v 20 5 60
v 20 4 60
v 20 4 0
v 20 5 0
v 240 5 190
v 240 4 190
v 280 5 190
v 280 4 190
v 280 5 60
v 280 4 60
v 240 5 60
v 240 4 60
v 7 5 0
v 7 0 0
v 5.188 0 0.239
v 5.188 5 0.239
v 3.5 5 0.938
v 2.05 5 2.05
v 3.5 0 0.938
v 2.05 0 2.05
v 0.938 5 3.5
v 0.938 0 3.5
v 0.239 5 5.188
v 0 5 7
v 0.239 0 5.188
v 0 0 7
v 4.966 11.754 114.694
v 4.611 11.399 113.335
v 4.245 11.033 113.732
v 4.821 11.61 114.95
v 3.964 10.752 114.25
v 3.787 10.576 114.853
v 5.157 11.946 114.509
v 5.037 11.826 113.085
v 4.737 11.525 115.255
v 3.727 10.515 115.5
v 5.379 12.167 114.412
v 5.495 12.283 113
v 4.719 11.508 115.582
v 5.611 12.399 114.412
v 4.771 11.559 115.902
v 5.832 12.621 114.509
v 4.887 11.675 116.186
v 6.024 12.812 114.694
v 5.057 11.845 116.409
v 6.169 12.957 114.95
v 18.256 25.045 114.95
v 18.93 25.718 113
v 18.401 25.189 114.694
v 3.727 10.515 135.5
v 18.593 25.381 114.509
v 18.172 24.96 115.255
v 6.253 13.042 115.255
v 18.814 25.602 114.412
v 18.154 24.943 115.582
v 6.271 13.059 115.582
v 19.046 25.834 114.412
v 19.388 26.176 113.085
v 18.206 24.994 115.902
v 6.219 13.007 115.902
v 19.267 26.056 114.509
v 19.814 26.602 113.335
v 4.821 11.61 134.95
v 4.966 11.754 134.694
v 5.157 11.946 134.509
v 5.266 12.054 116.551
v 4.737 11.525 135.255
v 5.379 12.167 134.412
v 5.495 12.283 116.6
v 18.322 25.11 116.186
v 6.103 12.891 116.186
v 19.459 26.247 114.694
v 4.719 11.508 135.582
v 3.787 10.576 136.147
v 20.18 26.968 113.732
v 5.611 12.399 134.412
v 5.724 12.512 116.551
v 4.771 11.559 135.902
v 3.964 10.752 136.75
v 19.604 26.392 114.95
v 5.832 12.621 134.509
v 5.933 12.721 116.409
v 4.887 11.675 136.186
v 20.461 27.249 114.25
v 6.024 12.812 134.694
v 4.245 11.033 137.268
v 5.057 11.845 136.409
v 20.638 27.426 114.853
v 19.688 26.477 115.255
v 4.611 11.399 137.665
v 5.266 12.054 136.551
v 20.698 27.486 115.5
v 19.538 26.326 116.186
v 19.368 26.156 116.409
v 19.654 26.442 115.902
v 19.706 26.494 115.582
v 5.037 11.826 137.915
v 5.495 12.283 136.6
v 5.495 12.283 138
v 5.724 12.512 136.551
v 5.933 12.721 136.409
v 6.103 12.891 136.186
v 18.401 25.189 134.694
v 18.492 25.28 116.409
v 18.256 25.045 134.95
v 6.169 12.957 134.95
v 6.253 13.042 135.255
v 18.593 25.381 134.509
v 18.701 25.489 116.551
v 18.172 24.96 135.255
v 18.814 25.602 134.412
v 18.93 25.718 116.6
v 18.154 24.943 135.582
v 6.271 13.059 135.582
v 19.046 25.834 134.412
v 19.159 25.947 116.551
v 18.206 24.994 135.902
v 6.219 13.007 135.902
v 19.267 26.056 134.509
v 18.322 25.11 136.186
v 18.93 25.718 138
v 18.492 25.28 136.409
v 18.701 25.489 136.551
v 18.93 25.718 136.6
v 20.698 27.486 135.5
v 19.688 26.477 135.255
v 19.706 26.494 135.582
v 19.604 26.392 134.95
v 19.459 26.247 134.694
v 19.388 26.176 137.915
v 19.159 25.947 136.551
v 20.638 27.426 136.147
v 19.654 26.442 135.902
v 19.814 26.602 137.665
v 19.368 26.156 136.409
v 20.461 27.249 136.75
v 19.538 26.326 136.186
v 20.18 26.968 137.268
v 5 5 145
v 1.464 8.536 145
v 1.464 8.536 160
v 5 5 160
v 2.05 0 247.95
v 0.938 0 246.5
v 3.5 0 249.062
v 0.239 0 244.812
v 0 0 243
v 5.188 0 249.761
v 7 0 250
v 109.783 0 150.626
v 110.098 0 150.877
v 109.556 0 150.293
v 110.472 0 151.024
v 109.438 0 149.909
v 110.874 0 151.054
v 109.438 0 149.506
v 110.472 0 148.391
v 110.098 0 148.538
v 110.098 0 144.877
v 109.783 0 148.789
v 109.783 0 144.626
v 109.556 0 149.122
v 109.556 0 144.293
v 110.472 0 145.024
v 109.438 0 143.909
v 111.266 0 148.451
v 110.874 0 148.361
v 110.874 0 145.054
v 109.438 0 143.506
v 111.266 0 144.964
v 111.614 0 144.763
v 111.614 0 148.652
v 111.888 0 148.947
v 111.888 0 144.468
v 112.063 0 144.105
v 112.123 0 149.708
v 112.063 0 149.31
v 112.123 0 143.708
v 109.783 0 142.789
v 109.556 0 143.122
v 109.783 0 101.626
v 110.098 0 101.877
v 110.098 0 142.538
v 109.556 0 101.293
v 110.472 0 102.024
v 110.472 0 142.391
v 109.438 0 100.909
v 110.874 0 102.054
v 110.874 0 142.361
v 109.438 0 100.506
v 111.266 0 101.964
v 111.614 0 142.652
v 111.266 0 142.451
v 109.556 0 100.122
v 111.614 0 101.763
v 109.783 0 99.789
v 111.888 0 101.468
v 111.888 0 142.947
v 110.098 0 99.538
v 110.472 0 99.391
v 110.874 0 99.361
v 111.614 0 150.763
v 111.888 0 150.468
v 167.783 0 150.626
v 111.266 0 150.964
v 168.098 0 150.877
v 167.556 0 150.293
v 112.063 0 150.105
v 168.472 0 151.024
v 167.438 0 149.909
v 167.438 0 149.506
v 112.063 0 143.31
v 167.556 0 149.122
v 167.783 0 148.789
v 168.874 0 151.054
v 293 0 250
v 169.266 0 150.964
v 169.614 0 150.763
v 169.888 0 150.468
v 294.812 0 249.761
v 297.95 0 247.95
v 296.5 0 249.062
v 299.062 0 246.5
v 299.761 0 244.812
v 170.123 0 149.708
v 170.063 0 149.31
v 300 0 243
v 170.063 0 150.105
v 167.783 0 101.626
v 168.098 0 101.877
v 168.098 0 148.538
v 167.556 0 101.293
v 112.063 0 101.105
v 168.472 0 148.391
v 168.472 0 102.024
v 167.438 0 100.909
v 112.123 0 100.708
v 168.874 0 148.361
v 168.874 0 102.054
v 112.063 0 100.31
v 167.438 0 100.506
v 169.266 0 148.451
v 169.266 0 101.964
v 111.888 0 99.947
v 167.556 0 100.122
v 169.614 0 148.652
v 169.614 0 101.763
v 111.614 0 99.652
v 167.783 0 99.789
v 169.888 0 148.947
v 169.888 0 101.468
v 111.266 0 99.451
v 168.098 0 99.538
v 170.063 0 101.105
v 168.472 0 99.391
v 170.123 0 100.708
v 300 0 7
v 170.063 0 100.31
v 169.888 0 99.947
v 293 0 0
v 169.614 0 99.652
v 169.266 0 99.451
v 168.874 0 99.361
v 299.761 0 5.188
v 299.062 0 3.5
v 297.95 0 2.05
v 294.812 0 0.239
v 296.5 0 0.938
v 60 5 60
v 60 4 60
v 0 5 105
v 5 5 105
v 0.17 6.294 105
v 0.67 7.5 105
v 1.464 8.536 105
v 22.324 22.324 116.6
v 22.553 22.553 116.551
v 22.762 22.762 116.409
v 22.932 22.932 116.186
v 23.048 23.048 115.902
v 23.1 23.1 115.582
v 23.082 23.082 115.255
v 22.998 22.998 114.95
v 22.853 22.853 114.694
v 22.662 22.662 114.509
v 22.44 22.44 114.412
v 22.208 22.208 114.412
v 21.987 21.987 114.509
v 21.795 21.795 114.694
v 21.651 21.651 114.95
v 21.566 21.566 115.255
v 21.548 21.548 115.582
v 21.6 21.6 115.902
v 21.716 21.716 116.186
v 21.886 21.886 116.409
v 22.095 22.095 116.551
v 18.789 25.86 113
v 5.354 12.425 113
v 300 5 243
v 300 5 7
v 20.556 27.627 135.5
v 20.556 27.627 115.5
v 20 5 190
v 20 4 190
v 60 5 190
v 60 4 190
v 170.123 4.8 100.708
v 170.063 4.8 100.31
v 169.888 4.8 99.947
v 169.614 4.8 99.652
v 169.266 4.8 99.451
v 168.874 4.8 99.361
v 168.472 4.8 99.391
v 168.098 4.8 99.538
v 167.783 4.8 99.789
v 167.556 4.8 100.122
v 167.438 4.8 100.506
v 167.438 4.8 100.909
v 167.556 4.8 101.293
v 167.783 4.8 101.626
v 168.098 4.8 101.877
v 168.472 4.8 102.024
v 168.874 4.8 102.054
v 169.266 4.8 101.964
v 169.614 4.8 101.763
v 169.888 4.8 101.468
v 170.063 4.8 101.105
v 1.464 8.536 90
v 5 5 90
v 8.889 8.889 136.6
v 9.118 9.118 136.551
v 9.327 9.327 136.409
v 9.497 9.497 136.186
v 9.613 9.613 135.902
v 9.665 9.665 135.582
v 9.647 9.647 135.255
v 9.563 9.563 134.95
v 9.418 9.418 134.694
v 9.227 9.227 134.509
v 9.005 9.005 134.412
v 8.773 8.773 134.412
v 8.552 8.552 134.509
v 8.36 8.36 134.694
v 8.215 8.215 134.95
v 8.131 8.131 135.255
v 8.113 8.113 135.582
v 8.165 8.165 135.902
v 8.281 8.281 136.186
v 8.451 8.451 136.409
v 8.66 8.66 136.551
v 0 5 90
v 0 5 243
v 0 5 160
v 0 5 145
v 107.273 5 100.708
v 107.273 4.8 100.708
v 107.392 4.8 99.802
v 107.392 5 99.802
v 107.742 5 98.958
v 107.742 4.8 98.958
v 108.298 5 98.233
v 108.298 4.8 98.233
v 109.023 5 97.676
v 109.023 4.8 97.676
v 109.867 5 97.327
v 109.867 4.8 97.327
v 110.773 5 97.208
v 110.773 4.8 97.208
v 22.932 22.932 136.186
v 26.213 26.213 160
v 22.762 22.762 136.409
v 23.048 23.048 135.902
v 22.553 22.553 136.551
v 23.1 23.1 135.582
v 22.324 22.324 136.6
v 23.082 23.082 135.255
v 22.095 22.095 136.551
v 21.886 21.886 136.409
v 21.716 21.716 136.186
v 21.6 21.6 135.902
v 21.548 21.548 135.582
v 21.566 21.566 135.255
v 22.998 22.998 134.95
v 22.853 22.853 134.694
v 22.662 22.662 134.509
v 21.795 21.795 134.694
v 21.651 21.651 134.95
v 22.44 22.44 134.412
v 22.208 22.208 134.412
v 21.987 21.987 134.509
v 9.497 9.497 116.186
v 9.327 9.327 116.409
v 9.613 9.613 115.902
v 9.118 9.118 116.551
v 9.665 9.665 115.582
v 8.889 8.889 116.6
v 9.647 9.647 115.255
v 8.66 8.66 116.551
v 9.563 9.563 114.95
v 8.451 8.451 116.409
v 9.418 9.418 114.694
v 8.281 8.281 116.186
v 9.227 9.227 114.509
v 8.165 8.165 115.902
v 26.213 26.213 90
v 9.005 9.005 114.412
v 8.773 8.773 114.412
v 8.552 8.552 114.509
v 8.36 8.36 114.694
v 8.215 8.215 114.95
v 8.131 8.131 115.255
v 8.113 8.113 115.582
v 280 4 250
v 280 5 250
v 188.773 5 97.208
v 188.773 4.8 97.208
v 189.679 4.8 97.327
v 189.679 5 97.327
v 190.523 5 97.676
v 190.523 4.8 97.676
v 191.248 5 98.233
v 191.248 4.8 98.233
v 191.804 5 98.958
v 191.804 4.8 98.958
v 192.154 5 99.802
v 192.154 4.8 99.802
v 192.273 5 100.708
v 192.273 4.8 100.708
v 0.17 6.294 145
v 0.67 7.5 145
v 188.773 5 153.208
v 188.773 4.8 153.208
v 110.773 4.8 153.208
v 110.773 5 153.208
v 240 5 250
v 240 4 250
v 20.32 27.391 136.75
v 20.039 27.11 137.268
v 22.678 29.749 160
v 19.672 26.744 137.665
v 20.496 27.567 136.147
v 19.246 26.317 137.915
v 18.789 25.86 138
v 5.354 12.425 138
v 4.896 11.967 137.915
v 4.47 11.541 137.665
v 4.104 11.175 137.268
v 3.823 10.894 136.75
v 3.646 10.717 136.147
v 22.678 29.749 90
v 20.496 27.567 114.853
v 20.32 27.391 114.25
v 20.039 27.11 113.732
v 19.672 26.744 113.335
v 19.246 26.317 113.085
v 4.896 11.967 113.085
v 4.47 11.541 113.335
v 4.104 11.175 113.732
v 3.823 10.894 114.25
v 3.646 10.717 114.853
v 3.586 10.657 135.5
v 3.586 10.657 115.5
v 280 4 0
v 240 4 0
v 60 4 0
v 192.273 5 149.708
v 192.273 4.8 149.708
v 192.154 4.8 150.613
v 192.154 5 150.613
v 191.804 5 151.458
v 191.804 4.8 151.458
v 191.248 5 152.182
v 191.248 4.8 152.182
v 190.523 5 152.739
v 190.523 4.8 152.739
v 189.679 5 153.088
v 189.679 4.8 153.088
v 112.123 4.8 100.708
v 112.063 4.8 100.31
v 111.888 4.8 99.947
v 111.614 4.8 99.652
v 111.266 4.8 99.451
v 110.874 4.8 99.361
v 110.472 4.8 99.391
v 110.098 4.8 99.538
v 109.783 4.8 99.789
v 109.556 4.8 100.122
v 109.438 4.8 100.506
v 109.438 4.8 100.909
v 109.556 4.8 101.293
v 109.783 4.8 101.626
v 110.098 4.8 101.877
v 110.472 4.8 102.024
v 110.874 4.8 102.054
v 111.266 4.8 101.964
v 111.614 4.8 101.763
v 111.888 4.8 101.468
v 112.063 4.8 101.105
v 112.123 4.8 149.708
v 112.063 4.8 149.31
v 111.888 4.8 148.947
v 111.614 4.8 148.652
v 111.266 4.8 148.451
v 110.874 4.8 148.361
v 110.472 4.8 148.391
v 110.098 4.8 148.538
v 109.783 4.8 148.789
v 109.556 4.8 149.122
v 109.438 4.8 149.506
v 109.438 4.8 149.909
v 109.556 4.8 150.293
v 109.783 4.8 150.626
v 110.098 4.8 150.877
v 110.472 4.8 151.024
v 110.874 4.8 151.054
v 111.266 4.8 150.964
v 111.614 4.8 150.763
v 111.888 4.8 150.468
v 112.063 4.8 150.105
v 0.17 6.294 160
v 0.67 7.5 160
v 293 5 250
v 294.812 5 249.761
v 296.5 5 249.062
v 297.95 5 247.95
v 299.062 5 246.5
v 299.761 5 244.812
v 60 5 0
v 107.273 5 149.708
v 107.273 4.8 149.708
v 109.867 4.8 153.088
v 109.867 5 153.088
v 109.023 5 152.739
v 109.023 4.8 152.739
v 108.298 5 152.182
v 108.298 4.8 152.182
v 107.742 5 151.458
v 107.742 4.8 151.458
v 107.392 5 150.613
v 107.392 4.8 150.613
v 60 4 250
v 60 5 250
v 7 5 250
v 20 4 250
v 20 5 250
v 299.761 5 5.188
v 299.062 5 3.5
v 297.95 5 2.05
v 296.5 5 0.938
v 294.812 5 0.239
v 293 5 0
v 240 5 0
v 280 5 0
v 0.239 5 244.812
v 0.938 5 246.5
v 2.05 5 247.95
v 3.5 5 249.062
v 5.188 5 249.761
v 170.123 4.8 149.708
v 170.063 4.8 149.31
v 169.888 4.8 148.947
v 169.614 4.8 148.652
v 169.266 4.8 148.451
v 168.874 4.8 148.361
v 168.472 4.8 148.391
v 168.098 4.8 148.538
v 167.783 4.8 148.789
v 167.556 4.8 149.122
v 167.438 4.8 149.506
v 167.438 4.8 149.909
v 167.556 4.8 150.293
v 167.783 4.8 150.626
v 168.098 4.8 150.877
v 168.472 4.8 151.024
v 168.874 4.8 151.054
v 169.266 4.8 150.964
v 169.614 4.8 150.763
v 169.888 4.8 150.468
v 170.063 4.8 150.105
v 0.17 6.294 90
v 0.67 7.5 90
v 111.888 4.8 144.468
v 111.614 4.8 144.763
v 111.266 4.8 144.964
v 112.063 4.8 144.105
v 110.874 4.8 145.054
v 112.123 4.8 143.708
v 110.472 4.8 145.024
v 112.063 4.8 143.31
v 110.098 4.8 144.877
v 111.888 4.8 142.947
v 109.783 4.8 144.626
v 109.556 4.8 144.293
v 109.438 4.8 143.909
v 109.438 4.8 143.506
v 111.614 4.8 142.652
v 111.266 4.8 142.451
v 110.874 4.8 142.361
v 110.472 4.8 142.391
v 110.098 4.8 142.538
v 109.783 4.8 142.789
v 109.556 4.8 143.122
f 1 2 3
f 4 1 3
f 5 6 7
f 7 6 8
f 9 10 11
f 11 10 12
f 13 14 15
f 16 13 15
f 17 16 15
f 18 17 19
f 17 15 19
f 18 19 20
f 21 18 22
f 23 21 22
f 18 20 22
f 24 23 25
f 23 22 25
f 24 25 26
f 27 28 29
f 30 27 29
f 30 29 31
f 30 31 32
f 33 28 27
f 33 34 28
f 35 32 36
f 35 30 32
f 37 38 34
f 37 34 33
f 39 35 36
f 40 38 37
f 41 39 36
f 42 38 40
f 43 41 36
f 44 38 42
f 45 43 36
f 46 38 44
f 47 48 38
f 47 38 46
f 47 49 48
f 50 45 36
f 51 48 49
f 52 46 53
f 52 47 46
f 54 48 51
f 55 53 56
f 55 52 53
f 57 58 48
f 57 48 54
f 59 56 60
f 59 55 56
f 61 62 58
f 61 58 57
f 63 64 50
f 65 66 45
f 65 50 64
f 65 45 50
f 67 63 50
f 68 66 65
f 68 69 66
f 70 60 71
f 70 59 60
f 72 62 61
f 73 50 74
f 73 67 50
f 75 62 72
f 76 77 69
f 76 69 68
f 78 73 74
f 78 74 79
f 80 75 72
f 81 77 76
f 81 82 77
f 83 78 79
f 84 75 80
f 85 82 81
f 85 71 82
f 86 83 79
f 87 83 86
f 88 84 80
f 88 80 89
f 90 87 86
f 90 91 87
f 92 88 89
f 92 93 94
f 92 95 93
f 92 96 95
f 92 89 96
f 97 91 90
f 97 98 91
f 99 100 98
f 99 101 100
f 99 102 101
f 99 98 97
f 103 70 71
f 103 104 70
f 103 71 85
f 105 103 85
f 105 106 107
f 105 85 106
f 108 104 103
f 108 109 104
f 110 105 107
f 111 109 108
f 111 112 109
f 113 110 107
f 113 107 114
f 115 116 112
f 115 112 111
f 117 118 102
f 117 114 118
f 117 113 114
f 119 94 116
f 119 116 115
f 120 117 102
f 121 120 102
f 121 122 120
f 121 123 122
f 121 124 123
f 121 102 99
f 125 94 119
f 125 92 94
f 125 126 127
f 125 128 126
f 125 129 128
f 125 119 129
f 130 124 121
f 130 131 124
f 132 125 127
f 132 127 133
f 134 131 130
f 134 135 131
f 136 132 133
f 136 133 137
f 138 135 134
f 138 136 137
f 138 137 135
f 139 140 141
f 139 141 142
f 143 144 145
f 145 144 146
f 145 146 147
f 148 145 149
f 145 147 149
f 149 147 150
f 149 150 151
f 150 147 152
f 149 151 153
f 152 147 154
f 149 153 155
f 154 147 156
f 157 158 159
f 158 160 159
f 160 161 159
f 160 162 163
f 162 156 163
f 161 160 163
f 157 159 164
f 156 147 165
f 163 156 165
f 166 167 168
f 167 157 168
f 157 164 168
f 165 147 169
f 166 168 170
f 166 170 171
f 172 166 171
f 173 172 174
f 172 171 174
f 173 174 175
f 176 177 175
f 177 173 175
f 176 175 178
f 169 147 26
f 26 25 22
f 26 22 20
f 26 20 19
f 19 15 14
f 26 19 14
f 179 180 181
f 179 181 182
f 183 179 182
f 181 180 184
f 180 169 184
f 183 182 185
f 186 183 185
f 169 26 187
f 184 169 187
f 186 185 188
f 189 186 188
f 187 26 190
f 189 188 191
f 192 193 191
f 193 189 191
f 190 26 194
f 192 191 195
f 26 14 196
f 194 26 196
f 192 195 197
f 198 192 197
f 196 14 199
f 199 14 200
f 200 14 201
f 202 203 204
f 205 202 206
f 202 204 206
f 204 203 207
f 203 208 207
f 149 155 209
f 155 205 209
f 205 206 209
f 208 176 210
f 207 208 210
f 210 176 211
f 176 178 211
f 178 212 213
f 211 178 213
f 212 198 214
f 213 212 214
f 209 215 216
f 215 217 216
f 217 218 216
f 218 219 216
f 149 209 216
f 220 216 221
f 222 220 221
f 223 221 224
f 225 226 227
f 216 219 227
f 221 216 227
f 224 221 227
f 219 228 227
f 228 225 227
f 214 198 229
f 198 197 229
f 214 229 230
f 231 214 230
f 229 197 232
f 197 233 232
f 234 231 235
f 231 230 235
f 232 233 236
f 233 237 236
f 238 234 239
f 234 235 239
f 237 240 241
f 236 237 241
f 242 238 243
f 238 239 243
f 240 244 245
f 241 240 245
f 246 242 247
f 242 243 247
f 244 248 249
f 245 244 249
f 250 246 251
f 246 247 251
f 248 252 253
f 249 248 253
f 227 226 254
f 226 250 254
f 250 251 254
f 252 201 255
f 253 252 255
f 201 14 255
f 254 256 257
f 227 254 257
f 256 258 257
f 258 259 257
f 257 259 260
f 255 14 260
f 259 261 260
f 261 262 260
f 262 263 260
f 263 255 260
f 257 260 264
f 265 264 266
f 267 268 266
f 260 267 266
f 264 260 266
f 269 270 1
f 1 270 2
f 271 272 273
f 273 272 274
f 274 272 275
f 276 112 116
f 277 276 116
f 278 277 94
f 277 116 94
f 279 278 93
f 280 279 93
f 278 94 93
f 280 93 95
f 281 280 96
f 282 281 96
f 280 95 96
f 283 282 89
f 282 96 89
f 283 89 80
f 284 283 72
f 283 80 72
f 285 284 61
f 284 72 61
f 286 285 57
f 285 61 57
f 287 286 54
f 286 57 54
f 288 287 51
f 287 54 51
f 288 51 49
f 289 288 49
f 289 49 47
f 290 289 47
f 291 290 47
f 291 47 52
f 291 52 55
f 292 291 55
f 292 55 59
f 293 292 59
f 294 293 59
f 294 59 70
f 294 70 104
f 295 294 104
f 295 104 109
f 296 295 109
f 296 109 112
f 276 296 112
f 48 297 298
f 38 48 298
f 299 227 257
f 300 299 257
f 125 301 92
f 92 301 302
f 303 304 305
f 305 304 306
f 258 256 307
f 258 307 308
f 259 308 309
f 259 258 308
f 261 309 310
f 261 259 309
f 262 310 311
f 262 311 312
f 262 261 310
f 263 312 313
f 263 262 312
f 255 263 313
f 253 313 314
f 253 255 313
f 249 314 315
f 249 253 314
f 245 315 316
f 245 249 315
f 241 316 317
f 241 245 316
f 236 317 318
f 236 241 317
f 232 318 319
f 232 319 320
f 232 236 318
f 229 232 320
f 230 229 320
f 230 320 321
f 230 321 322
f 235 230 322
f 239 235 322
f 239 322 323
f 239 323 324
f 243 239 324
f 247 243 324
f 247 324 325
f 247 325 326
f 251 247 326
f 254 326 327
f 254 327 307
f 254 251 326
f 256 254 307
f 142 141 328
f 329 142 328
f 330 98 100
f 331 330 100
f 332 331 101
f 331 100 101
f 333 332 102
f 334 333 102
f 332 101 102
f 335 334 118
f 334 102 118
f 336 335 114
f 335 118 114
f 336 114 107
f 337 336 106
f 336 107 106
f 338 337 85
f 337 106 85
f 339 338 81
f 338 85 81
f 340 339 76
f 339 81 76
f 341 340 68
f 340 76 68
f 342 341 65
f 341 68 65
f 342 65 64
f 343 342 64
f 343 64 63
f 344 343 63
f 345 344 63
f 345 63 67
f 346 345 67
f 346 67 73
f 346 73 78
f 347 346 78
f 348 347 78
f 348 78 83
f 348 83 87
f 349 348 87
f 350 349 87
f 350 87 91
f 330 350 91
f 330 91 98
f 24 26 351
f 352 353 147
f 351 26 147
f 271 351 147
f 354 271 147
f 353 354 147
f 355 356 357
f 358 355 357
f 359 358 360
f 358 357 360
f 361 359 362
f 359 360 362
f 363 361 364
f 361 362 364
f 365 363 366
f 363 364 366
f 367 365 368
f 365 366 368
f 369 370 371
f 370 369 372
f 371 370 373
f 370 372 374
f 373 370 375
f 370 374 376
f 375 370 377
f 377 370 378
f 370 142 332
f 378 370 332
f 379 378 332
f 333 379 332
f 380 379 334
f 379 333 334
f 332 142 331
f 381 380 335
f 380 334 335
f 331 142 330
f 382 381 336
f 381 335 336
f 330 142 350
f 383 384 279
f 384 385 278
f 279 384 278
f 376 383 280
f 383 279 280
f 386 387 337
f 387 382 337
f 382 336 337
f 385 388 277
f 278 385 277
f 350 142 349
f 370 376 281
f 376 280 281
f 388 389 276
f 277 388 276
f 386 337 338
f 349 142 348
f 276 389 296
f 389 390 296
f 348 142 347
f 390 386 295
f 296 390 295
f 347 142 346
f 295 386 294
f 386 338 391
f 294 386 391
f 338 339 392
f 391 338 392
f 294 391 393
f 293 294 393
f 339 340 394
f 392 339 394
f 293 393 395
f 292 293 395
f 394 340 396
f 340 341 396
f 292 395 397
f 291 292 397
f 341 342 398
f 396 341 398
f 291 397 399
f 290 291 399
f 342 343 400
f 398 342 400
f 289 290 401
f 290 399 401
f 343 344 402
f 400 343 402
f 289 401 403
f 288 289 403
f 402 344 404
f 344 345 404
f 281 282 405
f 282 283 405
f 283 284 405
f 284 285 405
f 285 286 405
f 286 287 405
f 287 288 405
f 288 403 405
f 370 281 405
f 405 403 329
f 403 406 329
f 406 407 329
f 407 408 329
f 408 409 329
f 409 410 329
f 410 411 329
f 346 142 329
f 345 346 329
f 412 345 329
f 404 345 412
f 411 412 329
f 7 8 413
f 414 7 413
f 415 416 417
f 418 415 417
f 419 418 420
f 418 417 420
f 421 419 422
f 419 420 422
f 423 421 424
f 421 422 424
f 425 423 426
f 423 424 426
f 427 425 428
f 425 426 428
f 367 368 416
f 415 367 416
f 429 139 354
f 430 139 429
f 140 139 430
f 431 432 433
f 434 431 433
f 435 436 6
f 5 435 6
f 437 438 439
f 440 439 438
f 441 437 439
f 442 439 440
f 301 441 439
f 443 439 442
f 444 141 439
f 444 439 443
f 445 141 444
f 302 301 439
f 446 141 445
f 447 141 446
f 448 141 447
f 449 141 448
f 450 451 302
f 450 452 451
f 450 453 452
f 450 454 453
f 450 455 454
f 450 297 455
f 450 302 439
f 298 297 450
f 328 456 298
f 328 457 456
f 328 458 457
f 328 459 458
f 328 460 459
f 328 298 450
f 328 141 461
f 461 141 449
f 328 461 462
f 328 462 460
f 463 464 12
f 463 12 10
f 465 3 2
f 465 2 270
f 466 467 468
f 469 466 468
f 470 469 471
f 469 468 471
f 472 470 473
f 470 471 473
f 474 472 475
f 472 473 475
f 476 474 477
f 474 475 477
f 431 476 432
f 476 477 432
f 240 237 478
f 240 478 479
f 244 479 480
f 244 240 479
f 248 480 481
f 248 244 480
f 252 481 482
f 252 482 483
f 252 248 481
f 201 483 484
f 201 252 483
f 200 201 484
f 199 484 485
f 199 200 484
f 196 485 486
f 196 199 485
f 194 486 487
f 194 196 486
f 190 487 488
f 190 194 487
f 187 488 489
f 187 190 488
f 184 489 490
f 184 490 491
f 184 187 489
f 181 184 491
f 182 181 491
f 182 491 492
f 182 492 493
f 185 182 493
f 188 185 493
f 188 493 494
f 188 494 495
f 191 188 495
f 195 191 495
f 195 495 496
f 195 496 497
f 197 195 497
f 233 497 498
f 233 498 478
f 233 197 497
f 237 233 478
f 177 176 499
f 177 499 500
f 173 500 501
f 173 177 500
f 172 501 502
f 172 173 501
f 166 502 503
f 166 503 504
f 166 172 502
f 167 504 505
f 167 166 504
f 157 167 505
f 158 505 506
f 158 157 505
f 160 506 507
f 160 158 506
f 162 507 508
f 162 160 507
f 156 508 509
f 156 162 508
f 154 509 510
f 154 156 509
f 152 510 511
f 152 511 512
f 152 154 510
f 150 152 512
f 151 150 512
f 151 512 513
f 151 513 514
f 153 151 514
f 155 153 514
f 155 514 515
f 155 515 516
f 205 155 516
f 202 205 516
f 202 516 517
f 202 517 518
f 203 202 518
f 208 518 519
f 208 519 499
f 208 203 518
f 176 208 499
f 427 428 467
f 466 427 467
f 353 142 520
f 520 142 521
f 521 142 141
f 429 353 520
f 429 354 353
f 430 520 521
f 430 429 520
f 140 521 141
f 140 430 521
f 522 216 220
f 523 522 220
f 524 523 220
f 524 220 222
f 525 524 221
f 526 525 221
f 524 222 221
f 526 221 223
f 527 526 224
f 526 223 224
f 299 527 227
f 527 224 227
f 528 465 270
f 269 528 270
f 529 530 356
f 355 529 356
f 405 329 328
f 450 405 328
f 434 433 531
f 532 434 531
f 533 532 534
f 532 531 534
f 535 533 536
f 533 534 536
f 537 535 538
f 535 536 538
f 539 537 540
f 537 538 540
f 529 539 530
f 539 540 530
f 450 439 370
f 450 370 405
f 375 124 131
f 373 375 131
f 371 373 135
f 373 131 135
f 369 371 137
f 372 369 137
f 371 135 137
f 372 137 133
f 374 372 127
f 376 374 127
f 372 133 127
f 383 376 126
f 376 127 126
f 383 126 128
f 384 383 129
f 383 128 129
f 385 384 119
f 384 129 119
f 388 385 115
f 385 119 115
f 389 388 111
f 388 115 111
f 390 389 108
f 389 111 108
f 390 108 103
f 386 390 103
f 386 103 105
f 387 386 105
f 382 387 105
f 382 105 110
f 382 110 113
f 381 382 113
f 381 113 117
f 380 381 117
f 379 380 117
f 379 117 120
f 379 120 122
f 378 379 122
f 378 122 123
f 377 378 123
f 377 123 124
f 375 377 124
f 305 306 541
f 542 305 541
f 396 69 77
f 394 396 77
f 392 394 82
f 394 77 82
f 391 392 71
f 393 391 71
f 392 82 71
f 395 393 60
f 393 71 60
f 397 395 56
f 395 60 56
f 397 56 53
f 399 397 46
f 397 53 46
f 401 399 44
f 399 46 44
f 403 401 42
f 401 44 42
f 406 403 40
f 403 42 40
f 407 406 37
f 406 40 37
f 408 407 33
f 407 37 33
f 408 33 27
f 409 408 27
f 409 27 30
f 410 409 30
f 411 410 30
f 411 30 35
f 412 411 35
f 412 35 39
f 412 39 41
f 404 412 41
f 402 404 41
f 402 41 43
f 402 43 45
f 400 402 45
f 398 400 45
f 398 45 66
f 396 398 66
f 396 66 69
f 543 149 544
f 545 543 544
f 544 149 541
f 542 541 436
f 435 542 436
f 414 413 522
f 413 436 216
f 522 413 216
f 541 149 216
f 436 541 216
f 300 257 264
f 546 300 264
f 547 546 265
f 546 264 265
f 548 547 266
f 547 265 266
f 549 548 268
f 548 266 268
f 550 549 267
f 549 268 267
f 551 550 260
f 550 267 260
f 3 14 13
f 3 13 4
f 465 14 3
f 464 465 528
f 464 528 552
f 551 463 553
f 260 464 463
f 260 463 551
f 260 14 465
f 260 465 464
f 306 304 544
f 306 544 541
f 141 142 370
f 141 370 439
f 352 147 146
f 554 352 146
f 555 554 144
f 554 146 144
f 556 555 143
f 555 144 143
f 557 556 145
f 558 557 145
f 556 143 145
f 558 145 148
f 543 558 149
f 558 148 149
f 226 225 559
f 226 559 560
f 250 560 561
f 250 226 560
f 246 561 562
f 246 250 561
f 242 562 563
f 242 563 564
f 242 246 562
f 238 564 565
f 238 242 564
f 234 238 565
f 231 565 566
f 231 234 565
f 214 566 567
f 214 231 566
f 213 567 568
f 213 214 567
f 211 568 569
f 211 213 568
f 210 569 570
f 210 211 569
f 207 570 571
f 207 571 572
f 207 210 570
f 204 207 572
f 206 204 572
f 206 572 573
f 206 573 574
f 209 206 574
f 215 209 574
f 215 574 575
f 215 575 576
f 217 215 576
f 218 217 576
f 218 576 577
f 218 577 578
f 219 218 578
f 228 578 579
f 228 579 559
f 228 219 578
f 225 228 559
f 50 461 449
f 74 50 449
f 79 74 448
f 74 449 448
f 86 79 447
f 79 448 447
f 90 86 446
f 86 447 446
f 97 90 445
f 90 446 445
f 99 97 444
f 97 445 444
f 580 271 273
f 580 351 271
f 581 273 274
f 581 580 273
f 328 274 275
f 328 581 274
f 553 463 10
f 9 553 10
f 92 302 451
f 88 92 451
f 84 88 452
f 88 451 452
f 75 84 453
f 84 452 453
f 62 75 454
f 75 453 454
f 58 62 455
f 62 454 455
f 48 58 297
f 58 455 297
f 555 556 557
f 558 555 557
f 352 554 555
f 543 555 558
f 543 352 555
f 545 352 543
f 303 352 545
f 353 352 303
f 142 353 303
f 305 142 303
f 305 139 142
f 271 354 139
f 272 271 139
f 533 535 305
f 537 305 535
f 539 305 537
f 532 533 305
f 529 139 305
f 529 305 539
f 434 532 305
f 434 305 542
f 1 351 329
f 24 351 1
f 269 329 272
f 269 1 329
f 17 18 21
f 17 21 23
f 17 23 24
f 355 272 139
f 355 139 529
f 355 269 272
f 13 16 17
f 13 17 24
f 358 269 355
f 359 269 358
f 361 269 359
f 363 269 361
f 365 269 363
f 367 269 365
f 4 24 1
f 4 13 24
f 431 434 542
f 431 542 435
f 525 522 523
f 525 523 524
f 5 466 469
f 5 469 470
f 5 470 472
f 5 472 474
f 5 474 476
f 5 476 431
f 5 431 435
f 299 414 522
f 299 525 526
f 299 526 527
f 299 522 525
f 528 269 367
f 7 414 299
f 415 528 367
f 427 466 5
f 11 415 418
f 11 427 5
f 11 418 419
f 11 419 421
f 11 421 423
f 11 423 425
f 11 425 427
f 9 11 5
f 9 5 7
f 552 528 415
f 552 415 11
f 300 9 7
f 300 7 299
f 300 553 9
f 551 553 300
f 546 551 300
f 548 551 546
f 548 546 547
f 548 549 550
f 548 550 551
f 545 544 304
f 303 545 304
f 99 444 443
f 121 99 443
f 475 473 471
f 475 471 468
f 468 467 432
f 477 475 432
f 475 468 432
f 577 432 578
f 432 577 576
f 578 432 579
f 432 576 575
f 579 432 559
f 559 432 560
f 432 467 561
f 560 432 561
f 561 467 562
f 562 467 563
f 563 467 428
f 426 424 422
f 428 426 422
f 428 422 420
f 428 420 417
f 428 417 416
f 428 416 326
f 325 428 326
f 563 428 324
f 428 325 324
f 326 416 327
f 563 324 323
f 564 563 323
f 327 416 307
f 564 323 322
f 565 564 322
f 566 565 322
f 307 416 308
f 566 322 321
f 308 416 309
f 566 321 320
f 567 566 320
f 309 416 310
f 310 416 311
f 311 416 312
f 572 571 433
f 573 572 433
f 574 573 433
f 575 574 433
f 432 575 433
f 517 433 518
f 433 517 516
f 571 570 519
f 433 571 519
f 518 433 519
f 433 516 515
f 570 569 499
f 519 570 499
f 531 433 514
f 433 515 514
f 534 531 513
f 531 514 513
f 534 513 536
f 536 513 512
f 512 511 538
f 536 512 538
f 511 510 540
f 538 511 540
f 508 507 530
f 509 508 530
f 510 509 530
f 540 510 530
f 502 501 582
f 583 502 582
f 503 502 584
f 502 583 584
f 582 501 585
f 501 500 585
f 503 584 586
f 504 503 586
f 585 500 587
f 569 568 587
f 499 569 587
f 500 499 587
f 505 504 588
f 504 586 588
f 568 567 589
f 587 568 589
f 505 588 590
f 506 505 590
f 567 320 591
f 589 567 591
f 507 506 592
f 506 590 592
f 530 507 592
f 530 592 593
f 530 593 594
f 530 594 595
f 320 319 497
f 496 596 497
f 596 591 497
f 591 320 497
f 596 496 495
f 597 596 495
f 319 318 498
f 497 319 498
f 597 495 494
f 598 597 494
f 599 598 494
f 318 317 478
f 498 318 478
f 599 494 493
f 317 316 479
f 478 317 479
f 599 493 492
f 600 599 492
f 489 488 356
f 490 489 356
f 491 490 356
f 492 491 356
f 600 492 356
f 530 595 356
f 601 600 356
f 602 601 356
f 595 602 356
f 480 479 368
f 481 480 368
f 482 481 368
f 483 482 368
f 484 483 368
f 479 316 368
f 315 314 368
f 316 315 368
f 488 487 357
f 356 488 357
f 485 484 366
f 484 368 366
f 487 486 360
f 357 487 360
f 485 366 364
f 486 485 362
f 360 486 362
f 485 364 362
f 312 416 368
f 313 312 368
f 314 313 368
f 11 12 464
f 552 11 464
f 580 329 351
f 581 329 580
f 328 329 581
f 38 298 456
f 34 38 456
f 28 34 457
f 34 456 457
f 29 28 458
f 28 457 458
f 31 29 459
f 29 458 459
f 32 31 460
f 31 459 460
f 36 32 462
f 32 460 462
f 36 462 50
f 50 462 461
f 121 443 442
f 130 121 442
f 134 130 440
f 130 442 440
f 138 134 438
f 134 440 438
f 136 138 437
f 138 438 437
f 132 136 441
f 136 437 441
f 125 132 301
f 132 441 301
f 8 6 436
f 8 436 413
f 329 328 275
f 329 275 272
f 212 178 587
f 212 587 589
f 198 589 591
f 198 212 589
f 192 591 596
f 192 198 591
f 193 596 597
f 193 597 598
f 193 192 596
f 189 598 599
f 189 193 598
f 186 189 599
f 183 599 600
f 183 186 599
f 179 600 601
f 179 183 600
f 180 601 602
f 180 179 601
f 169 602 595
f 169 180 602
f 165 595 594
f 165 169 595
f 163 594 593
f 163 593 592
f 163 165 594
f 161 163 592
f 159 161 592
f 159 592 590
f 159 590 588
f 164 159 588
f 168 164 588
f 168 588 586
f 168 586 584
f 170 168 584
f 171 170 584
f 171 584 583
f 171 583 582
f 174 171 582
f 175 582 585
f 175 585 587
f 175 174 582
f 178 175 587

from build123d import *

# Parameters (mm, degrees)
BOSS_EXTRUDE1_DEPTH      = 5
SKETCH1_3_R              = 1.35
BOSS_EXTRUDE2_DEPTH      = 4.8
SKETCH1_4_W              = 40
SKETCH1_4_H              = 60
BOSS_EXTRUDE3_DEPTH      = 4
SKETCH3_W                = 5
SKETCH3_H                = 15
REVOLVE3_ANGLE           = 45
REVOLVE3_OTHER_WAY_ANGLE = 45
SKETCH6_W                = 70
SKETCH6_H                = 5
BOSS_EXTRUDE6_DEPTH      = 30
SKETCH7_R                = 1.1
CUT_EXTRUDE1_DEPTH       = 0.2
SKETCH7_8_R              = 1.1
CUT_EXTRUDE2_DEPTH       = 6


with BuildPart() as part:
    # Sketch1 → Boss-Extrude1 (new body)
    with BuildSketch(Plane(origin=(0, 0, 0), x_dir=(1, 0, 0), z_dir=(0, 1, 0))):
        with BuildLine():
            Line((20, 0), (7, 0))
            ThreePointArc((7, 0), (2.050252532, -2.050252532), (0, -7))
            Line((0, -7), (0, -243))
            ThreePointArc((0, -243), (2.050252532, -247.949747468), (7, -250))
            Line((7, -250), (20, -250))
            Line((20, -250), (20, -190))
            Line((20, -190), (60, -190))
            Line((60, -190), (60, -250))
            Line((60, -250), (240, -250))
            Line((240, -250), (240, -190))
            Line((240, -190), (280, -190))
            Line((280, -190), (280, -250))
            Line((280, -250), (293, -250))
            ThreePointArc((293, -250), (297.949747468, -247.949747468), (300, -243))
            Line((300, -243), (300, -7))
            ThreePointArc((300, -7), (297.949747468, -2.050252532), (293, 0))
            Line((293, 0), (280, 0))
            Line((280, 0), (280, -60))
            Line((280, -60), (240, -60))
            Line((240, -60), (240, 0))
            Line((240, 0), (60, 0))
            Line((60, 0), (60, -60))
            Line((60, -60), (20, -60))
            Line((20, -60), (20, 0))
        make_face()
        with BuildLine():
            ThreePointArc((107.272783739, -100.70753353), (108.297910005, -98.232659796), (110.772783739, -97.20753353))
            Line((110.772783739, -97.20753353), (188.772783739, -97.20753353))
            ThreePointArc((188.772783739, -97.20753353), (191.247657473, -98.232659796), (192.272783739, -100.70753353))
            Line((192.272783739, -100.70753353), (192.272783739, -149.70753353))
            ThreePointArc((192.272783739, -149.70753353), (191.247657473, -152.182407265), (188.772783739, -153.20753353))
            Line((188.772783739, -153.20753353), (110.772783739, -153.20753353))
            ThreePointArc((110.772783739, -153.20753353), (108.297910005, -152.182407265), (107.272783739, -149.70753353))
            Line((107.272783739, -149.70753353), (107.272783739, -100.70753353))
        make_face(mode=Mode.SUBTRACT)
    extrude(amount=BOSS_EXTRUDE1_DEPTH)

    # Sketch1<3> → Boss-Extrude2 (add)
    with BuildSketch(Plane(origin=(0, 0, 0), x_dir=(1, 0, 0), z_dir=(0, 1, 0))):
        with BuildLine():
            Line((188.772783739, -97.20753353), (110.772783739, -97.20753353))
            ThreePointArc((110.772783739, -97.20753353), (108.297910005, -98.232659796), (107.272783739, -100.70753353))
            Line((107.272783739, -100.70753353), (107.272783739, -149.70753353))
            ThreePointArc((107.272783739, -149.70753353), (108.297910005, -152.182407265), (110.772783739, -153.20753353))
            Line((110.772783739, -153.20753353), (188.772783739, -153.20753353))
            ThreePointArc((188.772783739, -153.20753353), (191.247657473, -152.182407265), (192.272783739, -149.70753353))
            Line((192.272783739, -149.70753353), (192.272783739, -100.70753353))
            ThreePointArc((192.272783739, -100.70753353), (191.247657473, -98.232659796), (188.772783739, -97.20753353))
        make_face()
        with Locations((110.772783739, -149.70753353)):
            Circle(SKETCH1_3_R, mode=Mode.SUBTRACT)
        with Locations((110.772783739, -143.70753353)):
            Circle(SKETCH1_3_R, mode=Mode.SUBTRACT)
        with Locations((168.772783739, -149.70753353)):
            Circle(SKETCH1_3_R, mode=Mode.SUBTRACT)
        with Locations((110.772783739, -100.70753353)):
            Circle(SKETCH1_3_R, mode=Mode.SUBTRACT)
        with Locations((168.772783739, -100.70753353)):
            Circle(SKETCH1_3_R, mode=Mode.SUBTRACT)
    extrude(amount=BOSS_EXTRUDE2_DEPTH)

    # Sketch1<4> → Boss-Extrude3 (add)
    with BuildSketch(Plane(origin=(0, 0, 0), x_dir=(1, 0, 0), z_dir=(0, 1, 0))):
        with Locations((40, -30)):
            Rectangle(SKETCH1_4_W, SKETCH1_4_H)
        with Locations((260, -30)):
            Rectangle(SKETCH1_4_W, SKETCH1_4_H)
        with Locations((40, -220)):
            Rectangle(SKETCH1_4_W, SKETCH1_4_H)
        with Locations((260, -220)):
            Rectangle(SKETCH1_4_W, SKETCH1_4_H)
    extrude(amount=BOSS_EXTRUDE3_DEPTH)

    # Sketch3 → Revolve3 (revolve)
    with BuildSketch(Plane(origin=(0, 5, 0), x_dir=(1, 0, 0), z_dir=(0, 1, 0))):
        with Locations((2.5, -97.5)):
            Rectangle(SKETCH3_W, SKETCH3_H)
        with Locations((2.5, -152.5)):
            Rectangle(SKETCH3_W, SKETCH3_H)
    revolve(axis=Axis((5, 5, 105), (0, 0, -1)), revolution_arc=REVOLVE3_ANGLE)

    # Sketch3 → Revolve3 other way (revolve)
    with BuildSketch(Plane(origin=(0, 5, 0), x_dir=(1, 0, 0), z_dir=(0, 1, 0))):
        with Locations((2.5, -97.5)):
            Rectangle(SKETCH3_W, SKETCH3_H)
        with Locations((2.5, -152.5)):
            Rectangle(SKETCH3_W, SKETCH3_H)
    revolve(axis=Axis((5, 5, 105), (0, 0, 1)), revolution_arc=REVOLVE3_OTHER_WAY_ANGLE)


with BuildPart() as body_2:
    # Sketch6 → Boss-Extrude6 (new body)
    with BuildSketch(Plane(origin=(5, 5, 0), x_dir=(0, 0, -1), z_dir=(0.7071067811865487, 0.7071067811865465, 0))):
        with Locations((-125, 2.5)):
            Rectangle(SKETCH6_W, SKETCH6_H)
    extrude(amount=BOSS_EXTRUDE6_DEPTH)

    # Sketch7 → Cut-Extrude1 (cut)
    with BuildSketch(Plane(origin=(-3.535533906, 3.535533906, 0), x_dir=(0, 0, 1), z_dir=(-0.7071067811865465, 0.7071067811865486, 0))):
        with BuildLine():
            Line((115.5, 10.071067812), (135.5, 10.071067812))
            ThreePointArc((135.5, 10.071067812), (137.267766953, 10.803300859), (138, 12.571067812))
            Line((138, 12.571067812), (138, 31.571067812))
            ThreePointArc((138, 31.571067812), (137.267766953, 33.338834765), (135.5, 34.071067812))
            Line((135.5, 34.071067812), (115.5, 34.071067812))
            ThreePointArc((115.5, 34.071067812), (113.732233047, 33.338834765), (113, 31.571067812))
            Line((113, 31.571067812), (113, 12.571067812))
            ThreePointArc((113, 12.571067812), (113.732233047, 10.803300859), (115.5, 10.071067812))
        make_face()
        with Locations((115.5, 31.571067812)):
            Circle(SKETCH7_R, mode=Mode.SUBTRACT)
        with Locations((135.5, 31.571067812)):
            Circle(SKETCH7_R, mode=Mode.SUBTRACT)
        with Locations((115.5, 12.571067812)):
            Circle(SKETCH7_R, mode=Mode.SUBTRACT)
        with Locations((135.5, 12.571067812)):
            Circle(SKETCH7_R, mode=Mode.SUBTRACT)
    extrude(amount=-CUT_EXTRUDE1_DEPTH, mode=Mode.SUBTRACT)

    # Sketch7<8> → Cut-Extrude2 (cut)
    with BuildSketch(Plane(origin=(-3.535533906, 3.535533906, 0), x_dir=(0, 0, 1), z_dir=(-0.7071067811865465, 0.7071067811865486, 0))):
        with Locations((115.5, 31.571067812)):
            Circle(SKETCH7_8_R)
        with Locations((135.5, 31.571067812)):
            Circle(SKETCH7_8_R)
        with Locations((115.5, 12.571067812)):
            Circle(SKETCH7_8_R)
        with Locations((135.5, 12.571067812)):
            Circle(SKETCH7_8_R)
    extrude(amount=-CUT_EXTRUDE2_DEPTH, mode=Mode.SUBTRACT)


solid = Compound([part.part, body_2.part])
